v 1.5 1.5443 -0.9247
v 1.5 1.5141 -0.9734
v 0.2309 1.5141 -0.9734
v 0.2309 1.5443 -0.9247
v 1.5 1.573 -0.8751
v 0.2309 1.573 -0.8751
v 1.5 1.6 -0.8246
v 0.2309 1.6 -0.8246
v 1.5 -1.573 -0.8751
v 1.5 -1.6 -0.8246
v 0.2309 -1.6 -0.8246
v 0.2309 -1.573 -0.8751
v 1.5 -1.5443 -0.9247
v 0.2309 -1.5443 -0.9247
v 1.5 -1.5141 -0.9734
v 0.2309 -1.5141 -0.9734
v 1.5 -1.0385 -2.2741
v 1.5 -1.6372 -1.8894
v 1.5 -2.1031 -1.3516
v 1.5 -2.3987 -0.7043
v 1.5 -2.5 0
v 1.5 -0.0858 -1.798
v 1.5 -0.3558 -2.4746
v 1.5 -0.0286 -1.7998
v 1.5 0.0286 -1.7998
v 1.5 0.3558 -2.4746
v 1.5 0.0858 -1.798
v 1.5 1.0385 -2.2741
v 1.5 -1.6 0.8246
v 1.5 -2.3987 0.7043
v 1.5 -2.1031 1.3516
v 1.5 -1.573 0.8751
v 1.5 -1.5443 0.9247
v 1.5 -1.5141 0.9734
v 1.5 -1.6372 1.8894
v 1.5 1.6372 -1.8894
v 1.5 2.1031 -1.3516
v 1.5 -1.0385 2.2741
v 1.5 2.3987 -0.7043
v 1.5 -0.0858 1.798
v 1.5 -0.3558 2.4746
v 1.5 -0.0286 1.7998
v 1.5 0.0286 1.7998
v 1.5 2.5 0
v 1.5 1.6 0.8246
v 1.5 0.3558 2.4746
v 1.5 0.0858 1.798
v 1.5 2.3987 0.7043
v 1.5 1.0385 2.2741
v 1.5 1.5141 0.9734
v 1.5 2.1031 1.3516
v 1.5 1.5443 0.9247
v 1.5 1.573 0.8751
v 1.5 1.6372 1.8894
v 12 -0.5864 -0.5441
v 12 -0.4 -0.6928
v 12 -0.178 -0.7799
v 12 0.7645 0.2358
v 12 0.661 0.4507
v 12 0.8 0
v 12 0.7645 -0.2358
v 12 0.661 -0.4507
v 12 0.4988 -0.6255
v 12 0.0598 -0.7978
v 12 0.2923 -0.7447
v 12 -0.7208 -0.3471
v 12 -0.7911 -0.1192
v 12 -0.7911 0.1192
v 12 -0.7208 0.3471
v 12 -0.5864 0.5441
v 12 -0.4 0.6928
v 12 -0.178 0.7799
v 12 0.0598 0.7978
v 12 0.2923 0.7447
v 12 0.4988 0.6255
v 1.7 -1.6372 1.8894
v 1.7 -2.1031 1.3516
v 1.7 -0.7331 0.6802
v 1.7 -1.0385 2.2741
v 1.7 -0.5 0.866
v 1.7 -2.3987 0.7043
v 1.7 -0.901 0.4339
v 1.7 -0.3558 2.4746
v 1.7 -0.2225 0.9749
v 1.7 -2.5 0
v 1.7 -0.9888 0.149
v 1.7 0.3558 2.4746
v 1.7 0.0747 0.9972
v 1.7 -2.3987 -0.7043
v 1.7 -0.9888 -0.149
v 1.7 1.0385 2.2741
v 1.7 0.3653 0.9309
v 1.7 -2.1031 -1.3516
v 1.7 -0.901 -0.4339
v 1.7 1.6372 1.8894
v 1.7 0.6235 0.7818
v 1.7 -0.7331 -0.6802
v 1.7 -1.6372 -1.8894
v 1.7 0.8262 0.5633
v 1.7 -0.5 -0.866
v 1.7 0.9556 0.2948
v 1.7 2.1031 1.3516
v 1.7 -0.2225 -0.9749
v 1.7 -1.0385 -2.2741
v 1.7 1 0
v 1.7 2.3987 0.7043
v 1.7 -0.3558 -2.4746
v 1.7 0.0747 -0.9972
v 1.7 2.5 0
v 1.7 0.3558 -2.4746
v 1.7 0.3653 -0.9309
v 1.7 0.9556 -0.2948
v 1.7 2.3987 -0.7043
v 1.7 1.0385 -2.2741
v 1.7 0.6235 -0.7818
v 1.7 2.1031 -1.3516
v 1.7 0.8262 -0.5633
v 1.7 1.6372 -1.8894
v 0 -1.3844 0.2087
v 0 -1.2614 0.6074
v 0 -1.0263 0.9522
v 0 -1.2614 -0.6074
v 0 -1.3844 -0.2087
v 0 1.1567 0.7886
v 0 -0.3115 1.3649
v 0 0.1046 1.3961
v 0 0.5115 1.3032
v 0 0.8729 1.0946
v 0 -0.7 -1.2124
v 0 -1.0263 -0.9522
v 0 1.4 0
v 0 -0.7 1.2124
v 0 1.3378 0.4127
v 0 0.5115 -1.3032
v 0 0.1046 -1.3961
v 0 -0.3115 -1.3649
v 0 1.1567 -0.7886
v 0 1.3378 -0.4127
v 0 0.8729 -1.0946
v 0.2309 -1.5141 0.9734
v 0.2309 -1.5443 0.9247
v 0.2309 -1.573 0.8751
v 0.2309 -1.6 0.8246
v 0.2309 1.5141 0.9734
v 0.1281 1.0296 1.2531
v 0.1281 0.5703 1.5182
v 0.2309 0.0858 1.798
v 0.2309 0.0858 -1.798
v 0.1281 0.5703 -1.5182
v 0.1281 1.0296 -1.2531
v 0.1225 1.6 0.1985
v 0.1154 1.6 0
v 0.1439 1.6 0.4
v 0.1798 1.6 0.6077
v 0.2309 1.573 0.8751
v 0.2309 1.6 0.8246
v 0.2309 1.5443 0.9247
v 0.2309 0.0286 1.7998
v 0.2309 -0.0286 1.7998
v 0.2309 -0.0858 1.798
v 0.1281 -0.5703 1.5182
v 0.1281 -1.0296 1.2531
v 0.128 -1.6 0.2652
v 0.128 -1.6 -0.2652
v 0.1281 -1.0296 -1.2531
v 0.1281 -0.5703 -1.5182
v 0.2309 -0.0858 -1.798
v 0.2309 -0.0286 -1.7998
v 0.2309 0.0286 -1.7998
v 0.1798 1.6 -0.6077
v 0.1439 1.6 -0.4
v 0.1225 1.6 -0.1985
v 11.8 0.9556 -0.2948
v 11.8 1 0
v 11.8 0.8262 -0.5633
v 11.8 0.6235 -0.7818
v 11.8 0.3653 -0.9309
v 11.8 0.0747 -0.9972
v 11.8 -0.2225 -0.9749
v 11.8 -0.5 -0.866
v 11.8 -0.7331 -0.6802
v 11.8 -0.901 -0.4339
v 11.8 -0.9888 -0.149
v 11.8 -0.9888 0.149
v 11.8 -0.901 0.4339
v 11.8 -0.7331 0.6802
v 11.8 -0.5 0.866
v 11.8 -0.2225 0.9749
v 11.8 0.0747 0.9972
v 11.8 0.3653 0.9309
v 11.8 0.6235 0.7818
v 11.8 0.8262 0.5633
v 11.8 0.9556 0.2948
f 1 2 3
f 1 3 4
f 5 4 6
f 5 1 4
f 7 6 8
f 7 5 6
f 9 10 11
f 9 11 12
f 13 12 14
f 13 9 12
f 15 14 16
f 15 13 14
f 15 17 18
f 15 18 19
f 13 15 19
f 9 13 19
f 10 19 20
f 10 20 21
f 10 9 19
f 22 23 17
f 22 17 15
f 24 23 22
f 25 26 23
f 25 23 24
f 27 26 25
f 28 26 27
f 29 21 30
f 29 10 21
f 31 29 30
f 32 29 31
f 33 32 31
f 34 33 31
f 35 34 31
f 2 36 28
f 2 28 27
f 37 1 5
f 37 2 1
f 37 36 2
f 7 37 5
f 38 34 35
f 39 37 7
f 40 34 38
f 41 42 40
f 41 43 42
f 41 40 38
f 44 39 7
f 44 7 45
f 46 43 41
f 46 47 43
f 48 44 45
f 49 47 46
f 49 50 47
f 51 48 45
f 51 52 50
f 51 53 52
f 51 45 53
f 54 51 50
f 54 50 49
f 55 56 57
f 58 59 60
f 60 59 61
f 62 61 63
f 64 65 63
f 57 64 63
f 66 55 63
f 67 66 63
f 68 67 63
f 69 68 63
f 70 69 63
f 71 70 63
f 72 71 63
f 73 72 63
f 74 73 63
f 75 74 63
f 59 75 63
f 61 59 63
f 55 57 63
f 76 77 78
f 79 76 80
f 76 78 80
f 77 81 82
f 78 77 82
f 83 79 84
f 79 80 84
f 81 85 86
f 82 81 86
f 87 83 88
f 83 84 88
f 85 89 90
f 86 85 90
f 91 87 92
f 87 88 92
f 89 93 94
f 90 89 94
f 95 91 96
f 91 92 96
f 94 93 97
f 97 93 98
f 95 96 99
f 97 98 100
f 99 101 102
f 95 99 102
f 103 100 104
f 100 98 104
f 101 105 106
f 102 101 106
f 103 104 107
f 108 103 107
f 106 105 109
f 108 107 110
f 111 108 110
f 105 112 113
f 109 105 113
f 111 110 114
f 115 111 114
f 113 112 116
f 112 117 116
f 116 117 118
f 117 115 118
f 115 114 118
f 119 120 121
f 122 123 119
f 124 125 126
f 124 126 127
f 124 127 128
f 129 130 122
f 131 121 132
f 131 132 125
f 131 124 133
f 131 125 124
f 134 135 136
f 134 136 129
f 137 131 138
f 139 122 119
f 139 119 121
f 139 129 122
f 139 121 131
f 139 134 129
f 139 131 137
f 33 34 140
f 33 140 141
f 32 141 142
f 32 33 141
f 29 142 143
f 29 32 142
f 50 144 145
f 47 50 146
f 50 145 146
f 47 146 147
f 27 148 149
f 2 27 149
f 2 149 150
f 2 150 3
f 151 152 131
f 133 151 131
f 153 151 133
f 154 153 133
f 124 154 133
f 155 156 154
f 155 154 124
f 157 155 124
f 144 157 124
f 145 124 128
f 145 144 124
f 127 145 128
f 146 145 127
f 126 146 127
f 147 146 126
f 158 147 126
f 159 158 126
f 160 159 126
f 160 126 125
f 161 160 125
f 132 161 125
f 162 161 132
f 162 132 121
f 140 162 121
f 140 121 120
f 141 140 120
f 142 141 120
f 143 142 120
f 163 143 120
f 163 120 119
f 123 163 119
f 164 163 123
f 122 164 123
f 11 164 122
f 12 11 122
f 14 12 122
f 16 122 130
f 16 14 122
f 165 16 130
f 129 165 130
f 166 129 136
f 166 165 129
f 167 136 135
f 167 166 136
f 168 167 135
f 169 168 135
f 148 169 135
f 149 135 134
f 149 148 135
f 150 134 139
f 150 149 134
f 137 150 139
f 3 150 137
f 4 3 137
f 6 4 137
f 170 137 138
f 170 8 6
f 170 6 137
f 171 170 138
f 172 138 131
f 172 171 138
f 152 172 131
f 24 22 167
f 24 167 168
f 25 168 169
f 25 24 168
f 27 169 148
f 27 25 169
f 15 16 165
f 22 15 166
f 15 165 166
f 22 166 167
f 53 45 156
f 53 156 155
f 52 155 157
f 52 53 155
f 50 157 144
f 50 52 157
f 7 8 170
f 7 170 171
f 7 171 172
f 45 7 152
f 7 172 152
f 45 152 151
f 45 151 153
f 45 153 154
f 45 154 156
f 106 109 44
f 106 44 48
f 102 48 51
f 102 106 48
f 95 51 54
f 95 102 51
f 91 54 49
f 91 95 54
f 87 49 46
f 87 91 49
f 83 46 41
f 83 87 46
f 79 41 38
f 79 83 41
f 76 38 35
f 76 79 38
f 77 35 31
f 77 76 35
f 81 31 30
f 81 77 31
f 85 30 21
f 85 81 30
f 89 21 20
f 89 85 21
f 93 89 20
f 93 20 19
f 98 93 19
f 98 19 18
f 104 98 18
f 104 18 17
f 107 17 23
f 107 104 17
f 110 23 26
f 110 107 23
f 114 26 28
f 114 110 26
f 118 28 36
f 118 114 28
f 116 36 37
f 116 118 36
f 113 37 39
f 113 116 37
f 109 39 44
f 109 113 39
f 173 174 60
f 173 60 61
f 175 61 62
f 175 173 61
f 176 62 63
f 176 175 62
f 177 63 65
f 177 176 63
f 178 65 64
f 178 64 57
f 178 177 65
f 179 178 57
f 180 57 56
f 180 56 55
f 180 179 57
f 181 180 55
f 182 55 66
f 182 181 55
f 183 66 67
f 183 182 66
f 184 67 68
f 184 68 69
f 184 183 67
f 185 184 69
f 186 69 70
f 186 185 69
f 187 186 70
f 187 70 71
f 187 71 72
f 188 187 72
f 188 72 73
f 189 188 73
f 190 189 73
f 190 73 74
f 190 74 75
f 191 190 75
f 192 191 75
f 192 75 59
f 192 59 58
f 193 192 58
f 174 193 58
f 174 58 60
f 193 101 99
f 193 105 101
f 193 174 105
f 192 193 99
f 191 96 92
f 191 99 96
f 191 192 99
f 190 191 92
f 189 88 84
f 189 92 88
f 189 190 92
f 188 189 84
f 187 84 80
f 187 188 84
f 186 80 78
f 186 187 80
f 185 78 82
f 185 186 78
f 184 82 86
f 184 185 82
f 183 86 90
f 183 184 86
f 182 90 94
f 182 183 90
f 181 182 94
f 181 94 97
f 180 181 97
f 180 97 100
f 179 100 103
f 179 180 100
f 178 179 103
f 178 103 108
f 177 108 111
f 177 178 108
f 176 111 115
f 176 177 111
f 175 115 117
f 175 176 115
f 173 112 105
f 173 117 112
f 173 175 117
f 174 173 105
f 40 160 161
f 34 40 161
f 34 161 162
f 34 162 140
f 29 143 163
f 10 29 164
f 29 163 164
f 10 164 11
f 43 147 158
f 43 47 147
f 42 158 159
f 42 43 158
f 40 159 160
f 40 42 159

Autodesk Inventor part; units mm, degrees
ref_plane "YZ Plane" through (0, 0, 0) normal (1, 0, 0) x (0, 1, 0)
ref_plane "XZ Plane" through (0, 0, 0) normal (0, 1, 0) x (-1, 0, 0)
ref_plane "XY Plane" through (0, 0, 0) normal (0, 0, 1) x (1, 0, 0)
sketch "Sketch15" plane through (0, 0, 0) normal (0, 0, 1) x (1, 0, 0)
  line L0 (0, 0) -> (0, 1.4)
  line L1 (0.2309, 1.8) -> (1.5, 1.8)
  line L2 (1.5, 1.8) -> (1.5, 2.5)
  line L3 (1.5, 2.5) -> (1.7, 2.5)
  line L4 (1.7, 2.5) -> (1.7, 1)
  line L5 (1.7, 1) -> (12, 1)
  line L6 (12, 0) -> (0, 0)
  line L7 (0.2309, 1.8) -> (0, 1.4)
  line L8 (12, 1) -> (12, 0)
  dimension "d78" = 0.2
  dimension "d83" = 30
  dimension "d84" = 1
  dimension "d86" = 0.4
  dimension "d87" = 1.8
  dimension "d89" = 1.5
  dimension "d90" = 2.5
  dimension "d115" = 12
revolve "Revolution1" add sketch "Sketch15" angle 360 about axis through (12, 0, 0) along (-1, 0, 0)
thread "Thread2" size "M2x0.25" class "6g" standard "ANSI Metric M Profile" length 4
sketch "Sketch16" plane through (0, 0, 0) normal (-1, 0, 0) x (0, 0, 1)
  circle A0 centre (0, 0) radius 1.4 projected
  line L0 (0.9238, 1.6) -> (1.8475, 0)
  line L1 (1.8475, 0) -> (0.9238, -1.6)
  line L2 (0.9238, -1.6) -> (-0.9238, -1.6)
  line L3 (-0.9238, -1.6) -> (-1.8475, 0)
  line L4 (-1.8475, 0) -> (-0.9238, 1.6)
  line L5 (-0.9238, 1.6) -> (0.9238, 1.6)
  circle A1 centre (0, 0) radius 2.6573
  dimension "d104" = 3.2
extrude "Extrusion15" cut sketch "Sketch16" against normal up to surface (1.5 mm away) contours A1
chamfer "Chamfer5" distance 0.2 angle 45 1 edges at (12, -1, 0)
properties part number "Bolt"
